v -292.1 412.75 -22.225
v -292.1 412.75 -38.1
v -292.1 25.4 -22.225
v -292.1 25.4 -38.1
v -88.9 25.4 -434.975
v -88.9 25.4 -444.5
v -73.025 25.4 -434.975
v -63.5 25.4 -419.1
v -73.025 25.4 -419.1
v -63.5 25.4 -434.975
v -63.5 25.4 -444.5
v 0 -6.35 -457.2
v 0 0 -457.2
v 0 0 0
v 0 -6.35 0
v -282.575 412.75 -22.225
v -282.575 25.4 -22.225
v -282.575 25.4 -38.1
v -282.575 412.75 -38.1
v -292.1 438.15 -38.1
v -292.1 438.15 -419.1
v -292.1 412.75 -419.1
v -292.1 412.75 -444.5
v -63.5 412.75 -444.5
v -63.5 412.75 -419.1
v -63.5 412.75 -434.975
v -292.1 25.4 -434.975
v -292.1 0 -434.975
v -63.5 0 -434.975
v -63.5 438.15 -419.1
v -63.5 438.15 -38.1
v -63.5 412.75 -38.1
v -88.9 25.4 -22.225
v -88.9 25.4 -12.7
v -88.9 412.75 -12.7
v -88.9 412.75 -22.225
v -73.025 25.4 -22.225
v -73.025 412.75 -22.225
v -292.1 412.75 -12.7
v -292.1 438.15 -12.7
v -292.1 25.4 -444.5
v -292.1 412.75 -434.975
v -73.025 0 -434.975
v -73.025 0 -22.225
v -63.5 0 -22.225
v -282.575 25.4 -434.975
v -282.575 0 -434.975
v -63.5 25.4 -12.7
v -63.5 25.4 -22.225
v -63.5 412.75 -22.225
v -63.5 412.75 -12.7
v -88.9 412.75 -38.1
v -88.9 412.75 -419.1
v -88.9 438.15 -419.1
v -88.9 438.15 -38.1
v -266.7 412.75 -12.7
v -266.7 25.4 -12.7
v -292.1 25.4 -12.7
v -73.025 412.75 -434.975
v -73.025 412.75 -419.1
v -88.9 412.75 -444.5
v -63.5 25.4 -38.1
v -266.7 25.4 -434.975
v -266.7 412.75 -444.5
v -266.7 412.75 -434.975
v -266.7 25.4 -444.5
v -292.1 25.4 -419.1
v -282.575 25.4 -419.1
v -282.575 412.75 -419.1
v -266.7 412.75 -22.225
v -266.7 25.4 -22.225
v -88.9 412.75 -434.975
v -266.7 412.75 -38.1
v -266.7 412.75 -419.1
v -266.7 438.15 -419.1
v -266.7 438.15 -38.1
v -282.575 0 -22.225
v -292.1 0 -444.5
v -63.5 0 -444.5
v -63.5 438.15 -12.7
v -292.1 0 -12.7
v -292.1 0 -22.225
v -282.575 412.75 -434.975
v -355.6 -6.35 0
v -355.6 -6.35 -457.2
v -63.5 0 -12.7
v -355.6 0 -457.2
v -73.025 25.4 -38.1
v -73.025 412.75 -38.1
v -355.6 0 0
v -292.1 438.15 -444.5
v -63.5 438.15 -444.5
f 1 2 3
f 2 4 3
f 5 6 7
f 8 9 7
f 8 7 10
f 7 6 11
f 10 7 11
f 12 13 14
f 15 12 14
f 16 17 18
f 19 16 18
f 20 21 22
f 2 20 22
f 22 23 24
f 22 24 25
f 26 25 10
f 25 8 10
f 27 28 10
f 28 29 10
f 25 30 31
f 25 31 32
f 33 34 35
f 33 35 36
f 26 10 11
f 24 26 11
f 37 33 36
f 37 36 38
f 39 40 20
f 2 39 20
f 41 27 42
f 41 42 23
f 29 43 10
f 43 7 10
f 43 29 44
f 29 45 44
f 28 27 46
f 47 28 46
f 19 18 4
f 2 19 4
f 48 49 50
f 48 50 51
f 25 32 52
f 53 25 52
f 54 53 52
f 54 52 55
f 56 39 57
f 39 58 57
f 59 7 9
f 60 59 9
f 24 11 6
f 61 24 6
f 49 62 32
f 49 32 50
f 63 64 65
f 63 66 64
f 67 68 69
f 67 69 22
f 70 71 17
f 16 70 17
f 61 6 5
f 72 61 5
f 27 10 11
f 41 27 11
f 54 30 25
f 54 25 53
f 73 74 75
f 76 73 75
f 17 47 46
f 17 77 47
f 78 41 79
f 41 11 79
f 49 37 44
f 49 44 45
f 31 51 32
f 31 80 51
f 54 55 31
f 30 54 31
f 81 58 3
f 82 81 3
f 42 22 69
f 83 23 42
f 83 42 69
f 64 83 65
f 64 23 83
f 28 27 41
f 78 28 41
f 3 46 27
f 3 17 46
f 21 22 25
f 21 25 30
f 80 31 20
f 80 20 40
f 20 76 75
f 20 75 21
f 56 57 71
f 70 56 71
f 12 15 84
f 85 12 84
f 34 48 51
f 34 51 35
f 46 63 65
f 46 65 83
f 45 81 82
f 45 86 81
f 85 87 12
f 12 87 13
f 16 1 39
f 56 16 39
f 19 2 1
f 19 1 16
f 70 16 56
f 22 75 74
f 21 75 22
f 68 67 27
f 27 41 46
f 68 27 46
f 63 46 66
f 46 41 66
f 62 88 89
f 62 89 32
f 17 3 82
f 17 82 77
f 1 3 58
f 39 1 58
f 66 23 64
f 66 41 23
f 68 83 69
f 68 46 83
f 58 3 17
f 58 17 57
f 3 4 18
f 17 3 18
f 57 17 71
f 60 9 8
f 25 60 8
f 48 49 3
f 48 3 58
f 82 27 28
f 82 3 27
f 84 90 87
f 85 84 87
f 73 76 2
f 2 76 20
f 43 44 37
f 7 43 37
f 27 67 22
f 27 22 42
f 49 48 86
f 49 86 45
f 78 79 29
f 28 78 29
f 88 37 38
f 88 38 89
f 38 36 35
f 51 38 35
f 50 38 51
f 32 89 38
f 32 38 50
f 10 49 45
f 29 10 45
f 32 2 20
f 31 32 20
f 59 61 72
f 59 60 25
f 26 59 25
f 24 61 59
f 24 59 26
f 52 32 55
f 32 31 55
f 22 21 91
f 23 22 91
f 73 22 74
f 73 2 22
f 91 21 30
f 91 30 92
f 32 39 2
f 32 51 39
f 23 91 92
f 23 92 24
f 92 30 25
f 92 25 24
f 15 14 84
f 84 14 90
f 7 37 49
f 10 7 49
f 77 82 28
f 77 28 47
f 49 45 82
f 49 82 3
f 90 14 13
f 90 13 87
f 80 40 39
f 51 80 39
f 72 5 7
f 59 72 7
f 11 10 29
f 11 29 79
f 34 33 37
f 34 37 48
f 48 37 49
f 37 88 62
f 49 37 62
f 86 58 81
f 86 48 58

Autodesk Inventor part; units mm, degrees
sketch "BasePlateShapeAndLayout" plane through (0, 0, 0) normal (0, 1, 0) x (-1, 0, 0)
  line L0 (0, 0) -> (355.6, 0)
  line L1 (355.6, 0) -> (355.6, -457.2)
  line L2 (355.6, -457.2) -> (0, -457.2)
  line L3 (0, -457.2) -> (0, 0)
  line L4 (355.6, 0) -> (0, -457.2) construction
  line L5 (355.6, -457.2) -> (0, 0) construction
  line L6 (292.1, -444.5) -> (63.5, -444.5)
  line L7 (63.5, -444.5) -> (63.5, -12.7)
  line L8 (63.5, -12.7) -> (292.1, -12.7)
  line L9 (292.1, -12.7) -> (292.1, -444.5)
  line L10 (292.1, -444.5) -> (63.5, -12.7) construction
  line L11 (63.5, -444.5) -> (292.1, -12.7) construction
  line L12 (282.575, -22.225) -> (73.025, -22.225)
  line L13 (73.025, -22.225) -> (73.025, -434.975)
  line L14 (73.025, -434.975) -> (282.575, -434.975)
  line L15 (282.575, -434.975) -> (282.575, -22.225)
  line L16 (63.5, -173.0375) -> (63.5, -12.7)
  line L17 (292.1, -22.225) -> (292.1, -12.7)
  line L18 (292.1, -12.7) -> (282.575, -12.7)
  line L19 (282.575, -12.7) -> (282.575, -22.225)
  line L20 (282.575, -22.225) -> (292.1, -22.225)
  line L21 (292.1, -22.225) -> (292.1, -12.7)
  line L22 (63.5, -12.7) -> (73.025, -12.7)
  line L23 (73.025, -12.7) -> (73.025, -22.225)
  line L24 (73.025, -22.225) -> (63.5, -22.225)
  line L25 (63.5, -22.225) -> (63.5, -12.7)
  line L26 (73.025, -434.975) -> (63.5, -434.975)
  line L27 (63.5, -434.975) -> (63.5, -444.5)
  line L28 (63.5, -444.5) -> (73.025, -444.5)
  line L29 (73.025, -444.5) -> (73.025, -434.975)
  line L30 (282.575, -434.975) -> (292.1, -434.975)
  line L31 (292.1, -434.975) -> (292.1, -444.5)
  line L32 (292.1, -444.5) -> (282.575, -444.5)
  line L33 (282.575, -444.5) -> (282.575, -434.975)
  line L34 (292.1, -12.7) -> (282.575, -22.225)
  line L35 (63.5, -12.7) -> (73.025, -22.225)
  line L36 (63.5, -444.5) -> (73.025, -434.975)
  line L37 (292.1, -444.5) -> (282.575, -434.975)
  point P0 (177.8, -228.6)
  dimension "d0" = 355.6
  dimension "d1" = 457.2
  dimension "d52" = 228.6
  dimension "d53" = 431.8
  dimension "d54" = 9.525
extrude "Extrusion1" add sketch "BasePlateShapeAndLayout" against normal blind 6.35 contours L0 L1 L2 L3 | L37 L30 L9 | L6 L33 L37 | L6 L29 L14 L33 | L30 L15 L20 L9 | L14 L13 L12 L15 | L6 L36 L29 | L20 L34 L9 | L26 L7 L24 L13 | L36 L7 L26 | L12 L23 L8 L19 | L19 L8 L34 | L35 L8 L23 | L24 L7 L35
sketch "MountingHoles" plane through (0, 0, 0) normal (0, -1, 0) x (1, 0, 0)
  line L0 (0, -457.2) -> (0, 0) projected
  line L1 (0, 0) -> (-355.6, 0) projected
  line L2 (-25.4, -431.8) -> (-25.4, 0) construction
  line L3 (-25.4, -25.4) -> (-25.4, -457.2) construction
  line L4 (-355.6, -457.2) -> (0, -457.2) construction
  line L5 (-330.2, -431.8) -> (-355.6, -431.8) construction
  line L6 (-355.6, 0) -> (-355.6, -457.2) construction
  line L7 (-25.4, -431.8) -> (0, -431.8) construction
  point P0 (-25.4, -330.2)
  point P1 (-25.4, -228.6)
  point P2 (-25.4, -127)
  point P3 (-127, -431.8)
  point P4 (-127, -330.2)
  point P5 (-127, -228.6)
  point P6 (-127, -127)
  point P7 (-127, -25.4)
  point P8 (-228.6, -431.8)
  point P9 (-228.6, -330.2)
  point P10 (-228.6, -228.6)
  point P11 (-228.6, -127)
  point P12 (-228.6, -25.4)
  point P13 (-330.2, -330.2)
  point P14 (-330.2, -228.6)
  point P15 (-330.2, -127)
  point P16 (-330.2, -25.4)
  dimension "d8" = 101.6
  dimension "d11" = 101.6
ref_plane "Work Plane6" through (-63.5, 0, -12.7) normal (1, 0, 0) x (0, 0, -1)
ref_plane "Work Plane7" through (-63.5, 0, -22.225) normal (0, 0, 1) x (1, 0, 0)
ref_plane "Work Plane8" through (-63.5, 0, -434.975) normal (0, 0, -1) x (-1, 0, 0)
ref_plane "Work Plane9" through (-292.1, 0, -12.7) normal (-1, 0, 0) x (0, 0, 1)
sketch "Sketch7" plane through (-63.5, 0, -12.7) normal (1, 0, 0) x (0, 0, -1)
  line L0 (0, 0) -> (9.525, 0)
  line L1 (9.525, 0) -> (9.525, 25.4)
  line L2 (9.525, 25.4) -> (0, 25.4)
  line L3 (0, 25.4) -> (0, 0)
  line L4 (431.8, 0) -> (0, 0) projected
  line L5 (215.9, 0) -> (215.9, 19.2581) construction
  line L6 (431.8, 0) -> (422.275, 0)
  line L7 (422.275, 0) -> (422.275, 25.4)
  line L8 (422.275, 25.4) -> (431.8, 25.4)
  line L9 (431.8, 25.4) -> (431.8, 0)
  point P0 (-12.7, 0)
  point P1 (0, 0)
  point P2 (431.8, 0)
  point P3 (422.275, 0)
  dimension "d62" = 9.525
  dimension "d63" = 25.4
sketch "Sketch8" plane through (-63.5, 0, -22.225) normal (0, 0, 1) x (1, 0, 0)
  line L0 (0, 0) -> (-9.525, 0)
  line L1 (-9.525, 0) -> (-9.525, 25.4)
  line L2 (-9.525, 25.4) -> (0, 25.4)
  line L3 (0, 25.4) -> (0, 0)
  line L4 (-114.3, 0) -> (-114.3, 16.4265) construction
  line L5 (-228.6, 0) -> (-219.075, 0)
  line L6 (-219.075, 0) -> (-219.075, 25.4)
  line L7 (-219.075, 25.4) -> (-228.6, 25.4)
  line L8 (-228.6, 25.4) -> (-228.6, 0)
  point P0 (63.5, 0)
  point P1 (0, 0)
  point P2 (-228.6, 0)
  dimension "d64" = 9.525
  dimension "d65" = 25.4
extrude "Extrusion9" add sketch "Sketch7" against normal up to surface (228.6 mm away) separate body contours L3 L2 L1 L0
extrude "Extrusion10" add sketch "Sketch7" against normal up to surface (228.6 mm away) separate body contours L7 L8 L9 L4
extrude "Extrusion11" add sketch "Sketch8" against normal up to surface (412.75 mm away) separate body contours L0 L1 L2 L3
extrude "Extrusion12" add sketch "Sketch8" against normal up to surface (412.75 mm away) separate body contours L8 L7 L6 L5
sketch "Sketch9" plane through (-63.5, 25.4, -12.7) normal (0, 1, 0) x (1, 0, 0)
  line L0 (0, 9.525) -> (0, 0) projected
  line L1 (0, 0) -> (-25.4, 0)
  line L2 (-25.4, 0) -> (-25.4, 25.4)
  line L3 (-25.4, 25.4) -> (0, 25.4)
  line L4 (0, 25.4) -> (0, 0)
  line L5 (-25.4, 9.525) -> (-9.525, 9.525)
  line L6 (-114.3, 215.9) -> (-110.8317, 215.9) construction
  line L7 (-114.3, 215.9) -> (-114.3, 210.2054) construction
  line L8 (-9.525, 9.525) -> (-9.525, 25.4)
  line L9 (-228.6, 9.525) -> (-228.6, 0)
  line L10 (-228.6, 0) -> (-203.2, 0)
  line L11 (-203.2, 0) -> (-203.2, 25.4)
  line L12 (-203.2, 25.4) -> (-228.6, 25.4)
  line L13 (-228.6, 25.4) -> (-228.6, 0)
  line L14 (-203.2, 9.525) -> (-219.075, 9.525)
  line L15 (-219.075, 9.525) -> (-219.075, 25.4)
  line L16 (0, 422.275) -> (0, 431.8)
  line L17 (0, 431.8) -> (-25.4, 431.8)
  line L18 (-25.4, 431.8) -> (-25.4, 406.4)
  line L19 (-25.4, 406.4) -> (0, 406.4)
  line L20 (0, 406.4) -> (0, 431.8)
  line L21 (-25.4, 422.275) -> (-9.525, 422.275)
  line L22 (-9.525, 422.275) -> (-9.525, 406.4)
  line L23 (-228.6, 422.275) -> (-228.6, 431.8)
  line L24 (-228.6, 431.8) -> (-203.2, 431.8)
  line L25 (-203.2, 431.8) -> (-203.2, 406.4)
  line L26 (-203.2, 406.4) -> (-228.6, 406.4)
  line L27 (-228.6, 406.4) -> (-228.6, 431.8)
  line L28 (-203.2, 422.275) -> (-219.075, 422.275)
  line L29 (-219.075, 422.275) -> (-219.075, 406.4)
  point P0 (63.5, -12.7)
  point P1 (-9.525, 9.525)
  point P2 (0, 9.525)
  point P3 (-219.075, 9.525)
  dimension "d74" = 25.4
  dimension "d75" = 25.4
  dimension "d76" = 9.525
  dimension "d86" = 9.525
extrude "Extrusion13" add sketch "Sketch9" along normal blind 387.35 separate body contours L0 L1 L2 L5 L8 L3 L4
extrude "Extrusion14" add sketch "Sketch9" along normal blind 387.35 separate body contours L13 L12 L15 L14 L11 L10 L9
extrude "Extrusion15" add sketch "Sketch9" along normal blind 387.35 separate body contours L23 L24 L25 L28 L29 L26 L27
extrude "Extrusion16" add sketch "Sketch9" along normal blind 387.35 separate body contours L20 L19 L22 L21 L18 L17 L16
sketch "Sketch10" plane through (-63.5, 25.4, -12.7) normal (1, 0, 0) x (0, 0, -1)
  line L0 (0, 387.35) -> (25.4, 387.35) projected
  line L1 (0, 387.35) -> (25.4, 387.35)
  line L2 (25.4, 387.35) -> (25.4, 412.75)
  line L3 (25.4, 412.75) -> (0, 412.75)
  line L4 (0, 412.75) -> (0, 387.35)
  line L5 (215.9, -25.4) -> (215.9, 31.6013) construction
  line L6 (431.8, 387.35) -> (406.4, 387.35)
  line L7 (431.8, 387.35) -> (406.4, 387.35)
  line L8 (406.4, 387.35) -> (406.4, 412.75)
  line L9 (406.4, 412.75) -> (431.8, 412.75)
  line L10 (431.8, 412.75) -> (431.8, 387.35)
  point P0 (-12.7, -25.4)
  dimension "d87" = 25.4
  dimension "d88" = 25.4
sketch "Sketch11" plane through (-63.5, 25.4, -38.1) normal (0, 0, -1) x (-1, 0, 0)
  line L0 (0, 387.35) -> (25.4, 387.35)
  line L1 (25.4, 387.35) -> (25.4, 412.75)
  line L2 (25.4, 412.75) -> (0, 412.75)
  line L3 (0, 412.75) -> (0, 387.35)
  line L4 (114.3, -25.4) -> (114.3, -19.7607) construction
  line L5 (228.6, 387.35) -> (203.2, 387.35)
  line L6 (203.2, 387.35) -> (203.2, 412.75)
  line L7 (203.2, 412.75) -> (228.6, 412.75)
  line L8 (228.6, 412.75) -> (228.6, 387.35)
  point P0 (-63.5, -25.4)
  dimension "d89" = 25.4
  dimension "d90" = 25.4
extrude "Extrusion17" add sketch "Sketch10" against normal up to surface (228.6 mm away) separate body contours L4 L3 L2 L0
extrude "Extrusion18" add sketch "Sketch10" against normal up to surface (228.6 mm away) separate body contours L6 L8 L9 L10
extrude "Extrusion19" add sketch "Sketch11" along normal up to surface (381 mm away) separate body contours L3 L2 L1 L0
extrude "Extrusion20" add sketch "Sketch11" along normal up to surface (381 mm away) separate body contours L5 L6 L7 L8
equation "\"d62\" = d76"
equation "\"d64\" = d54"
equation "\"d65\" = d63"
equation "\"d74\" = d63"
equation "\"d75\" = d63"
equation "\"d86\" = d76"
equation "\"d87\" = d63"
equation "\"d88\" = d63"
equation "\"d89\" = d63"
equation "\"d90\" = d63"
properties part number "MUDBasePlate"
